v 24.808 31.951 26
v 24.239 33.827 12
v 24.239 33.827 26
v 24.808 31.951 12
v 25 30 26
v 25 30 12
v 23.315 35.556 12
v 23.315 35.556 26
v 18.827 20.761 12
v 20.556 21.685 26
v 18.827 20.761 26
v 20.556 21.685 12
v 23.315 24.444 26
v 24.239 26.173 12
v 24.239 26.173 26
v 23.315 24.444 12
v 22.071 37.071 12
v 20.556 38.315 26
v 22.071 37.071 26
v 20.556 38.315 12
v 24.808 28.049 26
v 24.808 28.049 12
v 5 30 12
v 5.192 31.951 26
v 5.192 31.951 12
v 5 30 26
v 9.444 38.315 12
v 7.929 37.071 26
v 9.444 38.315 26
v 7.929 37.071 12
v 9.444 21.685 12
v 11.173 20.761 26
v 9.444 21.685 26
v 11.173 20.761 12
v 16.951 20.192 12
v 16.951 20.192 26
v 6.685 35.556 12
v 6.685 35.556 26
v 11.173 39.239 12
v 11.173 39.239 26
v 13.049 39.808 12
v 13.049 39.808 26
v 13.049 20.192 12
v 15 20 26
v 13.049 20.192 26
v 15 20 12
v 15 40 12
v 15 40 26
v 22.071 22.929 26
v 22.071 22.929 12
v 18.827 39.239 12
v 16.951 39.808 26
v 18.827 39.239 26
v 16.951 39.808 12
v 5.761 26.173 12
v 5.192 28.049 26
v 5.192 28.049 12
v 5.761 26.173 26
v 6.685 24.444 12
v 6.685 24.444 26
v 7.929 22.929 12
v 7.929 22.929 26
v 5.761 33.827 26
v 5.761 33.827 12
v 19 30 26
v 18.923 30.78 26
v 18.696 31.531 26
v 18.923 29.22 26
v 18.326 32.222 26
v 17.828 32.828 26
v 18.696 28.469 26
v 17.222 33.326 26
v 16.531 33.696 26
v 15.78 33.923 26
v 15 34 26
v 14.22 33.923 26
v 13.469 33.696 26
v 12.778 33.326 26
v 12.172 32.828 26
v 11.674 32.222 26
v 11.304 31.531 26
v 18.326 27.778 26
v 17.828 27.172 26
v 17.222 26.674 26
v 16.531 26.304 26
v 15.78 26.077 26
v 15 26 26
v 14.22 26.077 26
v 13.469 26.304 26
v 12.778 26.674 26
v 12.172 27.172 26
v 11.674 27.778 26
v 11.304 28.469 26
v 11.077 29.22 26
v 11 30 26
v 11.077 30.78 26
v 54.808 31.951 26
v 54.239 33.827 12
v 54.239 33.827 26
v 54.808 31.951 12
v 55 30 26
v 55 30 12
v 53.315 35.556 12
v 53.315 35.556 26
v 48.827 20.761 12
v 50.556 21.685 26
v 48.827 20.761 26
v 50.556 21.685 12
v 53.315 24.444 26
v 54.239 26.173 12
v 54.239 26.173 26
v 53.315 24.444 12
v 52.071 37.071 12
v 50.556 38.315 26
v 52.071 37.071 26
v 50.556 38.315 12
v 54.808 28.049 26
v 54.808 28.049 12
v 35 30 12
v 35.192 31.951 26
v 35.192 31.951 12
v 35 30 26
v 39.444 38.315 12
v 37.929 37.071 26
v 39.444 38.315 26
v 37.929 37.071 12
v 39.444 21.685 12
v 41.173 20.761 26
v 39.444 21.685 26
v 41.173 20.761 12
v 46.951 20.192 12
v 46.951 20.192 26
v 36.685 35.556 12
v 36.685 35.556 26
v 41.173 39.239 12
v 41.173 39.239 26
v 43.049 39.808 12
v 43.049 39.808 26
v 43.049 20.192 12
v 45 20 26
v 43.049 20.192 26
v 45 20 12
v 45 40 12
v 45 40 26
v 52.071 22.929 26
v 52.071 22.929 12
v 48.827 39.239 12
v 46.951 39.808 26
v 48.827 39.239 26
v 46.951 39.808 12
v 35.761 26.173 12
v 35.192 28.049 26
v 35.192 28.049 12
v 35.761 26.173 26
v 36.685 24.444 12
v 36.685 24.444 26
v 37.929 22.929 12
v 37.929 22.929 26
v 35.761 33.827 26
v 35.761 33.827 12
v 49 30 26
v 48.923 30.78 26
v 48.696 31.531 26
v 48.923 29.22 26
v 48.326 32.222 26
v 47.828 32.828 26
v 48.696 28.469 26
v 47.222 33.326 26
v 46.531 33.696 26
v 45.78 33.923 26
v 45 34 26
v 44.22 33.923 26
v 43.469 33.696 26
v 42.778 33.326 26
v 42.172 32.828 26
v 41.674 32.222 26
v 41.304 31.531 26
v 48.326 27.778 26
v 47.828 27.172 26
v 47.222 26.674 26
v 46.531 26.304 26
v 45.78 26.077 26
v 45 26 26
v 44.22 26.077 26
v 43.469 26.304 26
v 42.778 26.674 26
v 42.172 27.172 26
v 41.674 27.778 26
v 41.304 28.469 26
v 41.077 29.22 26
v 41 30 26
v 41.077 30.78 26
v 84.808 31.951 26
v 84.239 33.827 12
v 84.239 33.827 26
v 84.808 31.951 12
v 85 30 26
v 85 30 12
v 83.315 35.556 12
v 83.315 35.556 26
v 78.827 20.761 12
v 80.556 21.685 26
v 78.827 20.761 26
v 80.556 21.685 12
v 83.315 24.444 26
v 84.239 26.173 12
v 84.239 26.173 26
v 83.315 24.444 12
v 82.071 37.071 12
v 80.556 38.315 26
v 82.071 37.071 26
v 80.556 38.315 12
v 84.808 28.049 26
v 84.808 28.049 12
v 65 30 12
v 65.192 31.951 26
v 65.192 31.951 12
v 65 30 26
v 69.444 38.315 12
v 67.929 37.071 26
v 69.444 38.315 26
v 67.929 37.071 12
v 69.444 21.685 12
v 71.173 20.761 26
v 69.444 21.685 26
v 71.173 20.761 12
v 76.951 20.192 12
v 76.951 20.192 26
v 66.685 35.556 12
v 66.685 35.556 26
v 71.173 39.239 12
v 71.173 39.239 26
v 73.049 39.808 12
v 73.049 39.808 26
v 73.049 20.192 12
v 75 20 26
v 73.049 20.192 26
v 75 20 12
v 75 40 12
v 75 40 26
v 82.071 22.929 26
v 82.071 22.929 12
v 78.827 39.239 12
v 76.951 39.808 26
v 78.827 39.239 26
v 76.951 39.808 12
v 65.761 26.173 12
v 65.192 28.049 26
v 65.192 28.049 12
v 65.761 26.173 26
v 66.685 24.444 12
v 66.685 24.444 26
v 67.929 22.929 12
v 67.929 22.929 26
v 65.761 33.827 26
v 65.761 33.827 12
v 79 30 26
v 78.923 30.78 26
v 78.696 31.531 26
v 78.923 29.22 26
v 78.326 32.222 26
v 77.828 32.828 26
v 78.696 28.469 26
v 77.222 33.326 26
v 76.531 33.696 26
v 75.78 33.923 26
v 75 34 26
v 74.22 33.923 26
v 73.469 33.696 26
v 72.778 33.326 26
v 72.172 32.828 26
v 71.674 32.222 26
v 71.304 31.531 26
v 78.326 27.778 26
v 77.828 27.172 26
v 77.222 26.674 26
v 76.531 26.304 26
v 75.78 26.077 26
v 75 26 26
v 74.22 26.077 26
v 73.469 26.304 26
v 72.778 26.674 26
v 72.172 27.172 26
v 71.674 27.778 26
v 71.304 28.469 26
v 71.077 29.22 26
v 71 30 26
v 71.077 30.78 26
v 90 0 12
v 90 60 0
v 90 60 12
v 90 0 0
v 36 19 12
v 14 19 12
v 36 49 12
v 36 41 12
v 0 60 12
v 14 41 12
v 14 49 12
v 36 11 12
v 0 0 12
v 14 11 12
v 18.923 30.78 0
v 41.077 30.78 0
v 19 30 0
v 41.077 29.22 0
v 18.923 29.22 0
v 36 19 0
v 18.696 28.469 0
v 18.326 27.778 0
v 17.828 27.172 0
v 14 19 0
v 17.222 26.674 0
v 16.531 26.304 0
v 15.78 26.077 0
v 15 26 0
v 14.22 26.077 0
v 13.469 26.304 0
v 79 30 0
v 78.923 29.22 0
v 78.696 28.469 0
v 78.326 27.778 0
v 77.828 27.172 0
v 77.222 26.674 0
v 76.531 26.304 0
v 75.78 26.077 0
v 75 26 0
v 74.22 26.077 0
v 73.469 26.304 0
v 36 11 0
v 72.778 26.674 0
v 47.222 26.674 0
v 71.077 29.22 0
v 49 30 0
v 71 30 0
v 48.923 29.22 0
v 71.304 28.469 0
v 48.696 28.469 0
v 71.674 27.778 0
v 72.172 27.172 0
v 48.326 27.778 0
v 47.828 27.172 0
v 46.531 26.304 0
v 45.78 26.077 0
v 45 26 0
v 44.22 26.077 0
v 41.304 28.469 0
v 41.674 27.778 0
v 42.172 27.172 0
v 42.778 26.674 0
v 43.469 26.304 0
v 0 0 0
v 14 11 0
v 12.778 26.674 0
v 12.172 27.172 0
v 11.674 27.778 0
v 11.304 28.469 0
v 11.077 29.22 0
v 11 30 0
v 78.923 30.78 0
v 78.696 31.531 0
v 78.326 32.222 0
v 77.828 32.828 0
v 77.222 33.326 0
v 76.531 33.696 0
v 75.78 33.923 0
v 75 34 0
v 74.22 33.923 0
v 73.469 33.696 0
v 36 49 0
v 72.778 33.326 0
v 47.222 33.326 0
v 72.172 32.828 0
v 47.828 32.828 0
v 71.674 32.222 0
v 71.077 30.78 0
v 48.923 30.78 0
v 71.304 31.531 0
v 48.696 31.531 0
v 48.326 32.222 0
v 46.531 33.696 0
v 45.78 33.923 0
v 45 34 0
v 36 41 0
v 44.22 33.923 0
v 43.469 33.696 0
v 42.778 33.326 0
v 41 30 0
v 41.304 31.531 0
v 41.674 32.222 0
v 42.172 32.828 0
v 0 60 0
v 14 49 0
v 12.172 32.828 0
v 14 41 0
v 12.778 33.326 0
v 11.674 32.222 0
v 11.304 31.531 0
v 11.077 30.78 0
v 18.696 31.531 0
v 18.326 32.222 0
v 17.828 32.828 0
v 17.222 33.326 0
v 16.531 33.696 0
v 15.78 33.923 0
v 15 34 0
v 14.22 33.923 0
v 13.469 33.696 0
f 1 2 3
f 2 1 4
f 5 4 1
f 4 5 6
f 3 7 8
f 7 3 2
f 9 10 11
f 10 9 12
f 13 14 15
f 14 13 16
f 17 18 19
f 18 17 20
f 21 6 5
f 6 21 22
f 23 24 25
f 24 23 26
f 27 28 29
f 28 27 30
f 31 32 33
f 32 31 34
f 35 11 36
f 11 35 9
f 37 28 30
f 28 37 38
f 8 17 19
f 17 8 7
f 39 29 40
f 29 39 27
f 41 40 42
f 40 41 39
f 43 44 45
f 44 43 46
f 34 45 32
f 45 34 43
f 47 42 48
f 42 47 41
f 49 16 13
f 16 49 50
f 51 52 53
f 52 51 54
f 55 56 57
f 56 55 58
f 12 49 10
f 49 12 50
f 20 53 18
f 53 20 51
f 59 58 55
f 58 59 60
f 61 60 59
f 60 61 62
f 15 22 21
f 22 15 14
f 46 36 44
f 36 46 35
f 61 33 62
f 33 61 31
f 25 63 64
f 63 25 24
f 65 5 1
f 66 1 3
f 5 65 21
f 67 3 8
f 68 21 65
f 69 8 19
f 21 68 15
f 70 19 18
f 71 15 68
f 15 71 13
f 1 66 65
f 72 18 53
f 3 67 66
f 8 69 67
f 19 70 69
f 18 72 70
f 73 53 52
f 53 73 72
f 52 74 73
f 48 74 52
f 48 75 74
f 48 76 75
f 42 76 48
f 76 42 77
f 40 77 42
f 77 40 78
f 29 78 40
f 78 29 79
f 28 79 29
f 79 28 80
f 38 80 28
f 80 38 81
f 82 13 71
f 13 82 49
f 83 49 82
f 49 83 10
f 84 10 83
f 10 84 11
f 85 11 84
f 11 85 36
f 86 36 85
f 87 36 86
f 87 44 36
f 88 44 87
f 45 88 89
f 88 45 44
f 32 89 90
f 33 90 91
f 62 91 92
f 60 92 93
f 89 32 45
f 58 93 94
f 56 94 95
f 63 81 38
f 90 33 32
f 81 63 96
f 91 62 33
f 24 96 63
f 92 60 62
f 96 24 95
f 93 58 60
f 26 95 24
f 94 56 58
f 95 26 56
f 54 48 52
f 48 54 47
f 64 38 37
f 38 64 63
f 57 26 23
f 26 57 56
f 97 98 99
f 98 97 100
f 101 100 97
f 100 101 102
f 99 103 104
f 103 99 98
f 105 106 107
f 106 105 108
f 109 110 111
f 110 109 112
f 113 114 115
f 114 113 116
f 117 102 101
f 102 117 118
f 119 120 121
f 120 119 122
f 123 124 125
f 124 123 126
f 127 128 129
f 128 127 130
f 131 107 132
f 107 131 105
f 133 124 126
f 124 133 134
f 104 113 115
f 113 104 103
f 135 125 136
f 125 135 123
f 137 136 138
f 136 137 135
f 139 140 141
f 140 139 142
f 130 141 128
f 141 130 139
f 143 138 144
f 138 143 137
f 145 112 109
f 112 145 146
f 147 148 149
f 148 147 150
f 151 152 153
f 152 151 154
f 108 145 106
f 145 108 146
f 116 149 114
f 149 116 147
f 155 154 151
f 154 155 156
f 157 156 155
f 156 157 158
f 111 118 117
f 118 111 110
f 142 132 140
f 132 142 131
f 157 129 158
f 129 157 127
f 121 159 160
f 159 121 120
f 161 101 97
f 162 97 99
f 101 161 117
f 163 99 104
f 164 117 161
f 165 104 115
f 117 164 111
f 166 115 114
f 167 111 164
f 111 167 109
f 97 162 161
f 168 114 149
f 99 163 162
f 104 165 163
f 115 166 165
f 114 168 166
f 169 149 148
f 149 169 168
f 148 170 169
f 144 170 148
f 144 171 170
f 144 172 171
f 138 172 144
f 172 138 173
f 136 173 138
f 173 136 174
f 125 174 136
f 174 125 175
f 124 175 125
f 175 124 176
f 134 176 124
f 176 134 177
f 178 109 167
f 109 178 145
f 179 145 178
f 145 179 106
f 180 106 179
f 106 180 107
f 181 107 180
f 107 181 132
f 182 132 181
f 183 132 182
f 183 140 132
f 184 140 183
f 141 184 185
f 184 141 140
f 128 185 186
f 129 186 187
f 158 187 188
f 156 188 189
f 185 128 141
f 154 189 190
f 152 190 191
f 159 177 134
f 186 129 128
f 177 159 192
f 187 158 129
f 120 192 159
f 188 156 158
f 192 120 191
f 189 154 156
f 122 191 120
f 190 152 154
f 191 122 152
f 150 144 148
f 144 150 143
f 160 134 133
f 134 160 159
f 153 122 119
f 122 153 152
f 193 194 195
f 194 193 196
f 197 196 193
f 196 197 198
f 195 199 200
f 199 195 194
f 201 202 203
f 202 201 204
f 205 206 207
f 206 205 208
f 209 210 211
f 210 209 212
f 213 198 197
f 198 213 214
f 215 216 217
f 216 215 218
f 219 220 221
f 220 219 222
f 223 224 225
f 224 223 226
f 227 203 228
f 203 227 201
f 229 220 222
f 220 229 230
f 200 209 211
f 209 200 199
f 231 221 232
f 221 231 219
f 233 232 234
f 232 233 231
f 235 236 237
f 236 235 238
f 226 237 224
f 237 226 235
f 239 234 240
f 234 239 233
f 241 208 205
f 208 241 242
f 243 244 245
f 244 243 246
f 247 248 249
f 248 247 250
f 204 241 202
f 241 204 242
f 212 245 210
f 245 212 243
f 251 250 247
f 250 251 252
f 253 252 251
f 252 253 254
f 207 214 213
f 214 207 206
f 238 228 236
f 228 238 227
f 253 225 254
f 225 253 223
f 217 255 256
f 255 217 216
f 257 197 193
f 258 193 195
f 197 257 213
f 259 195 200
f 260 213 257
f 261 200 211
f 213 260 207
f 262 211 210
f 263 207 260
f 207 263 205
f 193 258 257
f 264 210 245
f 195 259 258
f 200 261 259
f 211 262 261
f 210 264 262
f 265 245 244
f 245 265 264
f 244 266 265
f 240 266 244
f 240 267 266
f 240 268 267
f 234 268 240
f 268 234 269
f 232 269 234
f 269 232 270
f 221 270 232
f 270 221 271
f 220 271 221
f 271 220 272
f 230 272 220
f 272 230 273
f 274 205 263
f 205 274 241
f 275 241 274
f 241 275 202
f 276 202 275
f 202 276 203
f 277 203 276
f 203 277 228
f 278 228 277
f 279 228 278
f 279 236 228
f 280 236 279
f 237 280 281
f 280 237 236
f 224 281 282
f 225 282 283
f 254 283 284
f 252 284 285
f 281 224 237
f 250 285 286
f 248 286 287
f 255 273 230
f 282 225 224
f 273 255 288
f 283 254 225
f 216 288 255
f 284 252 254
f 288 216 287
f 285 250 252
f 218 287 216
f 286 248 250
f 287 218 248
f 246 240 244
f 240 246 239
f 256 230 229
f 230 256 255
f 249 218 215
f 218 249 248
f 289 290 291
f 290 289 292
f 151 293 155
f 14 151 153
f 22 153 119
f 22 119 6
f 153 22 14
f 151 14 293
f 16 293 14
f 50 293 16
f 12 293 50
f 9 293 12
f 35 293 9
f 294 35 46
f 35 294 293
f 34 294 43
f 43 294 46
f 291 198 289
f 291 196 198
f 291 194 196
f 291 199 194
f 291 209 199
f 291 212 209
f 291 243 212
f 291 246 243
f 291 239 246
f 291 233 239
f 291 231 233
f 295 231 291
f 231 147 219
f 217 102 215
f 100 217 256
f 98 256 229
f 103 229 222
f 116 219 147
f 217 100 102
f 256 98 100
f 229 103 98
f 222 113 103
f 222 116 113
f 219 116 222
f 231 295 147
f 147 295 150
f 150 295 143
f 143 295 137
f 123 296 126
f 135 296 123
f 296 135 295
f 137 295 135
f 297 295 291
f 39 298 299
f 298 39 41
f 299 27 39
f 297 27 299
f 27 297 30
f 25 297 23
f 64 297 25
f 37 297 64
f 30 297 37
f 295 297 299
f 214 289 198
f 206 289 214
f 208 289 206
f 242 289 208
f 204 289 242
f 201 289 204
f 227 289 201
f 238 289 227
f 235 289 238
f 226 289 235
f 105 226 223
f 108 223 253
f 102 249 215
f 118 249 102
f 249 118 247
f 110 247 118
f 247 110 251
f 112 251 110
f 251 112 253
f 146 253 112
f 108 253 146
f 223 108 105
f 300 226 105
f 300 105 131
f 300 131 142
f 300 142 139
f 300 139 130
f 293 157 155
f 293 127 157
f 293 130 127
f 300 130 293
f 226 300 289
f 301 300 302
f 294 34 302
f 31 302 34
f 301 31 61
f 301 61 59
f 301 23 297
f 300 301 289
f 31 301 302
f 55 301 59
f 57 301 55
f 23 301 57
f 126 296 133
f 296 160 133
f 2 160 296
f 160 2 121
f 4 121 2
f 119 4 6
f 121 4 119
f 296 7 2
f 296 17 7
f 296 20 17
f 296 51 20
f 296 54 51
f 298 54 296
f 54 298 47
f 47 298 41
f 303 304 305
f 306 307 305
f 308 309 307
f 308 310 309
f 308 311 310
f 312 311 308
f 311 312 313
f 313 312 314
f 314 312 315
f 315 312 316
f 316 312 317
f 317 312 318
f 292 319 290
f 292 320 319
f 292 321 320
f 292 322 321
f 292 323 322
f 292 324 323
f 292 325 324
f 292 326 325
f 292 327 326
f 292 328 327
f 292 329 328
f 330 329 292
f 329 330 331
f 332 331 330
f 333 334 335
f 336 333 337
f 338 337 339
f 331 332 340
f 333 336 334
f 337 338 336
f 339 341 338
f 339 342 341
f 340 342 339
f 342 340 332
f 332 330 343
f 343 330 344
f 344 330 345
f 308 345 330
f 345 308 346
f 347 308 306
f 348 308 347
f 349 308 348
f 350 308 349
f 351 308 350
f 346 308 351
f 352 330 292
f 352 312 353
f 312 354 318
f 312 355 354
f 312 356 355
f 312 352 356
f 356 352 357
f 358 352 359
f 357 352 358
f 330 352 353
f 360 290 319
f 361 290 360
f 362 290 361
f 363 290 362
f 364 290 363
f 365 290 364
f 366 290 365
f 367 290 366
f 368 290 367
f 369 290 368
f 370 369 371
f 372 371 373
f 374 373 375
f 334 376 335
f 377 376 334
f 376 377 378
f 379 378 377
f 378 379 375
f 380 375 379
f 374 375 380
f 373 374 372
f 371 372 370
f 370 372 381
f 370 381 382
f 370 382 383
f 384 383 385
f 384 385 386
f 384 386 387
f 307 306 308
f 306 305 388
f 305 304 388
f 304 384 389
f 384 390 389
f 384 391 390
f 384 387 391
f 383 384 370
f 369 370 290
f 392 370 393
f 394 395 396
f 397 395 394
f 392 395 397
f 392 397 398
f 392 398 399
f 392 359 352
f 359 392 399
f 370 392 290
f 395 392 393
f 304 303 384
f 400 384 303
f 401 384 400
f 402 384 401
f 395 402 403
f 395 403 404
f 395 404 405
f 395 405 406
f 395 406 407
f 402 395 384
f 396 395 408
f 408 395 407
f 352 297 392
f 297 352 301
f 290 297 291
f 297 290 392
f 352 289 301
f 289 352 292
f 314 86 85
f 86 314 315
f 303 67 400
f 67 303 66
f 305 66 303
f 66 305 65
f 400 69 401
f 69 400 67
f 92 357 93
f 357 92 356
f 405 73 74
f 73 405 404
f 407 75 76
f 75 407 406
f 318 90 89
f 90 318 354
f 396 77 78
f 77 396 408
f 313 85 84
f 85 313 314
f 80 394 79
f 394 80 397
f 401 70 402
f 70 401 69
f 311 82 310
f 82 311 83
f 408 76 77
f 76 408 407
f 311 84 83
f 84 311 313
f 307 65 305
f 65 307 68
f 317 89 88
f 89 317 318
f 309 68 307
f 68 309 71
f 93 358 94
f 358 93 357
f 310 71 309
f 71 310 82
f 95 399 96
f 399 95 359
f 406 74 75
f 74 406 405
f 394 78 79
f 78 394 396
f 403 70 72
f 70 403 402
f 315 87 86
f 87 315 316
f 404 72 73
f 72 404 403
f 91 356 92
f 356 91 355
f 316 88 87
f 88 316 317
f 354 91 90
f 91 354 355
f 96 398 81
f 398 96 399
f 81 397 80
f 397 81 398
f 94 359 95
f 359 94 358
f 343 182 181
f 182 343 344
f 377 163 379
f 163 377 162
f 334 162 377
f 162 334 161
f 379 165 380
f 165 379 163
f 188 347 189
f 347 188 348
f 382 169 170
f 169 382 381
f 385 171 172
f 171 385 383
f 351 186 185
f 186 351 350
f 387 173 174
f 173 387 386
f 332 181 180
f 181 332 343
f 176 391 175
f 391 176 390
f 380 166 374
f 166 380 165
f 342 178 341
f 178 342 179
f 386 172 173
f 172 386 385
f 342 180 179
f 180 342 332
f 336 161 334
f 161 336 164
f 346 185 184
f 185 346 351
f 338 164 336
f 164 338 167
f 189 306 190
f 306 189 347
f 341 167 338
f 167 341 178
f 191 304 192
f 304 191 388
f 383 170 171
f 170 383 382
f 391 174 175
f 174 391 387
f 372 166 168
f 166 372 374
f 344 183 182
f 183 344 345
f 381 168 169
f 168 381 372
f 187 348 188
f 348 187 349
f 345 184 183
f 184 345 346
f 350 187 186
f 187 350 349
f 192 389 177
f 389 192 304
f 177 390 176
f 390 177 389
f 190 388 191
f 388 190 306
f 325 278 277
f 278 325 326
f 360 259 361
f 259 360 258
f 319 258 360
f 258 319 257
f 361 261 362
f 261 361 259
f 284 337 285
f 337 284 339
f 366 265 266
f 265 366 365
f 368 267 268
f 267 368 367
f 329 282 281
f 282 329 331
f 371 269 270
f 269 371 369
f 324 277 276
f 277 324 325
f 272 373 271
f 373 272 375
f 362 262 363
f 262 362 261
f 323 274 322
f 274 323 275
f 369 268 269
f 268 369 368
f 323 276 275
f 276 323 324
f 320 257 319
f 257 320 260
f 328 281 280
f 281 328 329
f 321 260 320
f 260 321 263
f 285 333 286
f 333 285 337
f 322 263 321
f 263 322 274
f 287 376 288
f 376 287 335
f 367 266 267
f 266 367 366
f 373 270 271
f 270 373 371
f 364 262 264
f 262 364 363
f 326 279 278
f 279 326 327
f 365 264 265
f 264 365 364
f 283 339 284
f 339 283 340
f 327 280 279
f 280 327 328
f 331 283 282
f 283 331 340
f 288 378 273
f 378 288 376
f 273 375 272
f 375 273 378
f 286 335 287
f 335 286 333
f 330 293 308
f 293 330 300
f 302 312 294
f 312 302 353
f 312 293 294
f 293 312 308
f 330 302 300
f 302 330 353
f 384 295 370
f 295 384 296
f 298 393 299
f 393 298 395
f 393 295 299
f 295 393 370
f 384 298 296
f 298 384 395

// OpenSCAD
$fn = 32;

// ----------------------------------------------------------------------
// Drill jig: three_boss_slot jig
// ----------------------------------------------------------------------

// --- parameters (mm) ---
plate_l = 90;             // plate length, X
plate_w = 60;             // plate width, Y
plate_t = 12;             // plate thickness
boss_d = 20;              // guide boss diameter
boss_h = 15;              // boss height above the plate
guide_d = 8;              // guide hole diameter
boss_pitch = 30;          // boss pitch
slot_w = 8;               // clamp slot width
slot_l = 22;              // clamp slot length
slot_x = 14;              // slot start X

n_boss = 3;  // guide bosses
boss_x0 = (plate_l - (n_boss - 1) * boss_pitch) / 2;  // first boss X
boss_top = plate_t - 1 + boss_h;  // boss crown height
total_h = boss_top;  // overall height

difference() {
  union() {
  cube([plate_l, plate_w, plate_t]);
  for (i = [0 : n_boss - 1])
    translate([boss_x0 + i * boss_pitch, plate_w / 2, plate_t - 1])
      cylinder(h = boss_h, d = boss_d);
  }
  for (i = [0 : n_boss - 1])
    translate([boss_x0 + i * boss_pitch, plate_w / 2, -1])
      cylinder(h = plate_t + boss_h, d = guide_d);
  for (cy = [plate_w * 0.25, plate_w * 0.75])
    translate([slot_x, cy - slot_w / 2, -1])
      cube([slot_l, slot_w, plate_t + 2]);
}
